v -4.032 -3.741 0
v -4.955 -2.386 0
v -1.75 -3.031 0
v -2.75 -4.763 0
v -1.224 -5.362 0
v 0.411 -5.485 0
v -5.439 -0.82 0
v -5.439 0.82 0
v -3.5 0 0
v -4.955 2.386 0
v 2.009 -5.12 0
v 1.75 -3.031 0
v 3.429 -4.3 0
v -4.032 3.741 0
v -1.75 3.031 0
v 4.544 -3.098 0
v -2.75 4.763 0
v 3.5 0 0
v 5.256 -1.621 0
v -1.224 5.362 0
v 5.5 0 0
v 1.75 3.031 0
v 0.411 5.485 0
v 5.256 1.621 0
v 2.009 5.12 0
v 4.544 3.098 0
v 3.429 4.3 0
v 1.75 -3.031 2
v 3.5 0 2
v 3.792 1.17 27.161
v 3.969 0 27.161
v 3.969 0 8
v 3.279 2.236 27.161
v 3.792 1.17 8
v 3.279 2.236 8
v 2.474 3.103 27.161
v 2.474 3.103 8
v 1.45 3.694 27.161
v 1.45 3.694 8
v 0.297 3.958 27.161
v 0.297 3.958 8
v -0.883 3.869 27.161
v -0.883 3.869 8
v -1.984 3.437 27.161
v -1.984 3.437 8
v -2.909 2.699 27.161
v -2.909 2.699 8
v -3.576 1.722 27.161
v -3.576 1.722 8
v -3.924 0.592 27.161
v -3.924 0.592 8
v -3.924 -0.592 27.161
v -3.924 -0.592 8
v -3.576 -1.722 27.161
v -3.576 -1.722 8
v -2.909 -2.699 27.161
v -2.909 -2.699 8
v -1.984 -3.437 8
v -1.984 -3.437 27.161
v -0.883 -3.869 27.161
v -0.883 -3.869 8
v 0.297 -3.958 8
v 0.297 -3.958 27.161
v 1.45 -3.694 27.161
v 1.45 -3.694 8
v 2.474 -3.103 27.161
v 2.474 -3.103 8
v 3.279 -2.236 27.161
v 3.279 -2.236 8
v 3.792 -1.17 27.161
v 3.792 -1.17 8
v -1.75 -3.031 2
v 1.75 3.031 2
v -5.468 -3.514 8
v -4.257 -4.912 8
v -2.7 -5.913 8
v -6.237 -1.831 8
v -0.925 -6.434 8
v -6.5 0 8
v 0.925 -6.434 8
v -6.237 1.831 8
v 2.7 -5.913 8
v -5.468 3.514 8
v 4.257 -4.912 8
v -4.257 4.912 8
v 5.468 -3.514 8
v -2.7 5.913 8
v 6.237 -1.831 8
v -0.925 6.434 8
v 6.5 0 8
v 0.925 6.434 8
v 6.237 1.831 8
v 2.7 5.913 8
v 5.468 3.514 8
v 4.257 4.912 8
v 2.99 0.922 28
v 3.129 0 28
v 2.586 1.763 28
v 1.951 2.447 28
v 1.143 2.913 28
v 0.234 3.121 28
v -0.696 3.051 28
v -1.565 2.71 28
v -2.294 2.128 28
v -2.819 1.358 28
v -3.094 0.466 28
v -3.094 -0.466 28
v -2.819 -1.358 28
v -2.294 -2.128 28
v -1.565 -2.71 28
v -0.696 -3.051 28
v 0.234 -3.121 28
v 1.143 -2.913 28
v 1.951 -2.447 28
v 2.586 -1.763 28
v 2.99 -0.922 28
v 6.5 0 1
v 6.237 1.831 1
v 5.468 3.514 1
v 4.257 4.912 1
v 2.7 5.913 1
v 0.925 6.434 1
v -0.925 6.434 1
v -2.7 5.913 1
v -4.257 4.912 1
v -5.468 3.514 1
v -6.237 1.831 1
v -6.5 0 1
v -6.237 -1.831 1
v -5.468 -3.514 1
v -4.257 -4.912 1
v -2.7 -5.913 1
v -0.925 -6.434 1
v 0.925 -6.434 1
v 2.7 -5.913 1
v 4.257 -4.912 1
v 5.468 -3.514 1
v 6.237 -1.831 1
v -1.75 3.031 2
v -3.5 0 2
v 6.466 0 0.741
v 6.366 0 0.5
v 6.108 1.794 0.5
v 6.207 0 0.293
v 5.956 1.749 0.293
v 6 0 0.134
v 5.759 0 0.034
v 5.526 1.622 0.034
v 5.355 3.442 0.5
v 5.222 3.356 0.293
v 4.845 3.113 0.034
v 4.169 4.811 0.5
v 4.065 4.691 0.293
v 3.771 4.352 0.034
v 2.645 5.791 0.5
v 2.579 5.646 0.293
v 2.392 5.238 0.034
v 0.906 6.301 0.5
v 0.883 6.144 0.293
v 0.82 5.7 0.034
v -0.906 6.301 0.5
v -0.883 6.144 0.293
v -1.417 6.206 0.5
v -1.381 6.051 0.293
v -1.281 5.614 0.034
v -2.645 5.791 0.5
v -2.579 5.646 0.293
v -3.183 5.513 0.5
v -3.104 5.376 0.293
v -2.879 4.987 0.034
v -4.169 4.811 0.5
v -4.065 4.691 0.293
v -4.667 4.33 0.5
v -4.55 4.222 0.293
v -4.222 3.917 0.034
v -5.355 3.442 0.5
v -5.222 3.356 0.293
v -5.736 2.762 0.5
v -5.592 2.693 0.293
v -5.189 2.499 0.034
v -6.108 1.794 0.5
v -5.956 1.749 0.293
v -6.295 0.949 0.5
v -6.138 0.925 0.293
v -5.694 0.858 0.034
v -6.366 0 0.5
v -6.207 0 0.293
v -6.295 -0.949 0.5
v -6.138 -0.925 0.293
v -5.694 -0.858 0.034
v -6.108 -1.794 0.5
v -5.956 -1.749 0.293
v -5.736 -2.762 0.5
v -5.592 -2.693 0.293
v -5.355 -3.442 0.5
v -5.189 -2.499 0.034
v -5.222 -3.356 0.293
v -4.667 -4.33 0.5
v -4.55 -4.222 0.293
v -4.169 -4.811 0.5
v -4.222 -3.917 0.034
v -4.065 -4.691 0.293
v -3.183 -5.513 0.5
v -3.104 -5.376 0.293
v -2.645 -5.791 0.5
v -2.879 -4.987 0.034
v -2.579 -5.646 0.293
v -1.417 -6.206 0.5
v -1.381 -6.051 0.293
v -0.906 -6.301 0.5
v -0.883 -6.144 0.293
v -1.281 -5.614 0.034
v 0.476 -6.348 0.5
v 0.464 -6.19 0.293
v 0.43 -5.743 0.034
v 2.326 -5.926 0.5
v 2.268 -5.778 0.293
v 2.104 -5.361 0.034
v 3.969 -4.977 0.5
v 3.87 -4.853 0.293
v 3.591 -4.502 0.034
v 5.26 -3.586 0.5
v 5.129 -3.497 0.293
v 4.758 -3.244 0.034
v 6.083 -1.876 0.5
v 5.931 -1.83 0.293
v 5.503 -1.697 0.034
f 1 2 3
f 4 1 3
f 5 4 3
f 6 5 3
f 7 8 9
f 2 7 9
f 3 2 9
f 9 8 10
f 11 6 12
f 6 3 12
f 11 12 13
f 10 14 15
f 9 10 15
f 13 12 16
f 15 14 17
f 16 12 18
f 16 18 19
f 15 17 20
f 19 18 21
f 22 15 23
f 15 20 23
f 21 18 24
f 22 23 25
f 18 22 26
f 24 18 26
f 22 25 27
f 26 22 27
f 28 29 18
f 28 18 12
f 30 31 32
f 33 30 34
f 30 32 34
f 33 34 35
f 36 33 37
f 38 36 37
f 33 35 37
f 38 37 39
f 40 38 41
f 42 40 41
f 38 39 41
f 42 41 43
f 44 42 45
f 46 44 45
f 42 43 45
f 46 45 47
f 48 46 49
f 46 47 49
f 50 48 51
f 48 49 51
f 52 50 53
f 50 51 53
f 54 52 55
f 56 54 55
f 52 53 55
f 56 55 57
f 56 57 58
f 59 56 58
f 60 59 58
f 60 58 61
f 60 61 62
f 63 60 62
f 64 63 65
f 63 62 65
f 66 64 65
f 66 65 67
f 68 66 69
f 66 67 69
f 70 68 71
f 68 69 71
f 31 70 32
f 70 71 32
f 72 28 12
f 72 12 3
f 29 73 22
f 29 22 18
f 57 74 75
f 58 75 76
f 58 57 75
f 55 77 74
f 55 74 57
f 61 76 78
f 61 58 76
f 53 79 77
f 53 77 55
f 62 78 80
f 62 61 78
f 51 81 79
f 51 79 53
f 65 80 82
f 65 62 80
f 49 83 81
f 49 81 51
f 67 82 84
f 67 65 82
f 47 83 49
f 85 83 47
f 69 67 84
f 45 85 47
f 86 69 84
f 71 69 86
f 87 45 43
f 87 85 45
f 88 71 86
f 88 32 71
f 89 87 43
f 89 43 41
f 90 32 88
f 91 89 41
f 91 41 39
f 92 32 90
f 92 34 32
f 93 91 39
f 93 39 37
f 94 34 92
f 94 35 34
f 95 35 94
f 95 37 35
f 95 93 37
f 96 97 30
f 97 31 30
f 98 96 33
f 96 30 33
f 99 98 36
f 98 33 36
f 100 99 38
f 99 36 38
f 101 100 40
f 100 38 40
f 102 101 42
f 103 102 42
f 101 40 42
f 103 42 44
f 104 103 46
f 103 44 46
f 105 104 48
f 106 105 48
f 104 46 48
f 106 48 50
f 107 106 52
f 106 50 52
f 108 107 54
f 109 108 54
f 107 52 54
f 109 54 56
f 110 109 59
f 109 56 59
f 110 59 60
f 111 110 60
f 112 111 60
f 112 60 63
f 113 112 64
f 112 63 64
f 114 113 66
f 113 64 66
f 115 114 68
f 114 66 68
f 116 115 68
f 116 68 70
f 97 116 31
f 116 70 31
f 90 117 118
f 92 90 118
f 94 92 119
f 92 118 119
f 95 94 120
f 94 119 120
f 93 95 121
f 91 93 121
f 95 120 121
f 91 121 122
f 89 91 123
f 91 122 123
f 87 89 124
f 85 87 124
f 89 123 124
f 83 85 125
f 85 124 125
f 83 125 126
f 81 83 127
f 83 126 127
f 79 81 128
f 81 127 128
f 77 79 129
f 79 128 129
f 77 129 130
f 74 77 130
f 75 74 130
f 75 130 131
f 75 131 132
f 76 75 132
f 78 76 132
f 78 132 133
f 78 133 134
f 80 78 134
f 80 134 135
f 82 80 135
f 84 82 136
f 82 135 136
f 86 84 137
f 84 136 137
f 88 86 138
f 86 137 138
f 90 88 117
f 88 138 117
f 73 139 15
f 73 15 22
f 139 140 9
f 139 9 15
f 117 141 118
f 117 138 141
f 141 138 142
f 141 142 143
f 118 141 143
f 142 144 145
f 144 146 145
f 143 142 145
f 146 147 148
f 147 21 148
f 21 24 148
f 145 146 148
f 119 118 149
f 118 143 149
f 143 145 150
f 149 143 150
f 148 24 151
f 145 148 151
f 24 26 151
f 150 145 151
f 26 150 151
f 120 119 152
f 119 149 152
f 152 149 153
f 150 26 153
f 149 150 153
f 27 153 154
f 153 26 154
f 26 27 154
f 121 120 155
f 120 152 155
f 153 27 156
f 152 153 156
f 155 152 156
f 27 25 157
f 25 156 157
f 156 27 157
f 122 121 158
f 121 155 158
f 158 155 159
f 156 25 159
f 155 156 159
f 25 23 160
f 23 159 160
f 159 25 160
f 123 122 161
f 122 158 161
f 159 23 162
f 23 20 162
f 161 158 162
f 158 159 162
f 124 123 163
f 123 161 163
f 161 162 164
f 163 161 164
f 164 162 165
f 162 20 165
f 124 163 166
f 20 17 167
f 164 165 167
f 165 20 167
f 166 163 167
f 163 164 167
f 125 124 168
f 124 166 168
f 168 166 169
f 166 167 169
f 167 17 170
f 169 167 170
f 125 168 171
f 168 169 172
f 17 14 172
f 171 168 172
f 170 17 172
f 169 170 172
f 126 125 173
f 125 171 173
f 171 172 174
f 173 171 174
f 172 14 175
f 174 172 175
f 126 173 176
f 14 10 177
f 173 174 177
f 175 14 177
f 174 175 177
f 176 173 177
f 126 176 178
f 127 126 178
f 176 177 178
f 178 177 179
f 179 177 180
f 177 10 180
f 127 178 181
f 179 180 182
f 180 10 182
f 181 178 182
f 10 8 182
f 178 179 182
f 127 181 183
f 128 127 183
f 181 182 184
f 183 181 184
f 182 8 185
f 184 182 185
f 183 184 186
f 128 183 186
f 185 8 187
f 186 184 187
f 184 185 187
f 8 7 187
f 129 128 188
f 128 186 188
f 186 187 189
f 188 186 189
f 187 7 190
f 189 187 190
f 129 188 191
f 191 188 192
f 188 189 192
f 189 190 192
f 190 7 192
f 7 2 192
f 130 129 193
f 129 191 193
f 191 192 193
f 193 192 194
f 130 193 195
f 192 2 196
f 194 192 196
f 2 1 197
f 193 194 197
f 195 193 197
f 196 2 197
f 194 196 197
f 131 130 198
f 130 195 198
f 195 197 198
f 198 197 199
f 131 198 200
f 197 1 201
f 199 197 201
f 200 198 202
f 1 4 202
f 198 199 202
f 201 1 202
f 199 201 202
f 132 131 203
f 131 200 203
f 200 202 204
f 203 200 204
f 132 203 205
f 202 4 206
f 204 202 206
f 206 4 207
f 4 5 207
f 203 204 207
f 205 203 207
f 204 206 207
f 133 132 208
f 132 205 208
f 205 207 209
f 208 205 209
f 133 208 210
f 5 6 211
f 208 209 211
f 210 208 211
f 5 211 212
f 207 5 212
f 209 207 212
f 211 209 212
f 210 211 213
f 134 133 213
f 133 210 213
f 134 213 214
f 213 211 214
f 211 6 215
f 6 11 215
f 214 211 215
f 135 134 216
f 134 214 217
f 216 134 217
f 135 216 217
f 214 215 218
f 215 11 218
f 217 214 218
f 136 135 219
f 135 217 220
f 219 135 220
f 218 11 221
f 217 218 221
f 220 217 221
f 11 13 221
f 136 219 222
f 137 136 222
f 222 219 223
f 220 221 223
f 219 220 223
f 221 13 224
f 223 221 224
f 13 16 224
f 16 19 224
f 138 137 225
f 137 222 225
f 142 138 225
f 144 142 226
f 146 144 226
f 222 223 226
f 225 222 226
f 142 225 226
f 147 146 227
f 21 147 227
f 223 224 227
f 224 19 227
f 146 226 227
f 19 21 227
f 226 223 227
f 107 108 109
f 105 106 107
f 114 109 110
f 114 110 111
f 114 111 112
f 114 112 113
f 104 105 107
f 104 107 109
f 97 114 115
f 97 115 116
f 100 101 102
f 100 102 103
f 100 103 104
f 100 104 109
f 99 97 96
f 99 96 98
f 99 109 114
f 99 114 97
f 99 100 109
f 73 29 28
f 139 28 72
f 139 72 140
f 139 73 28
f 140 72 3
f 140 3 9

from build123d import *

# Parameters (mm, degrees)
SKETCH_1_R               = 6.5
EXTRUDE_1_DEPTH          = 8
SKETCH_2_R               = 4
EXTRUDE_2_DEPTH          = 20
FILLET_1_R               = 1
CUT_EXTRUDE_1_DEPTH      = 30.470324079
CUT_EXTRUDE_1_DEPTH_BACK = 2


# Read off the part's stored shape, not the designer's step: 5/16-18 机械螺纹 螺柱1
with BuildPart() as part:
    # 草图1 → 凸台-拉伸1 (new body)
    with BuildSketch(Plane.XY):
        Circle(SKETCH_1_R)
    extrude(amount=EXTRUDE_1_DEPTH)

    # 草图2 → 凸台-拉伸2 (add)
    with BuildSketch(Plane.XY.offset(8)):
        Circle(SKETCH_2_R)
    extrude(amount=EXTRUDE_2_DEPTH)

    # 5/16-18 机械螺纹 螺柱1 outline → 5/16-18 机械螺纹 螺柱1 (revolve, cut)
    with BuildSketch(Plane.XZ):
        Polygon((4, 28), (3.12928, 28), (3.96875, 27.16053), (3.96875, 8), (4, 8), align=None)
    revolve(axis=Axis((0, 0, 0), (0, 0, 1)), mode=Mode.SUBTRACT)

    # 圆角1
    fillet_1_edges = [part.edges().sort_by_distance(p)[0] for p in [
        (-6.5, 0, 0),
    ]]
    fillet(fillet_1_edges, radius=FILLET_1_R)

    # 草图4 → 切除-拉伸1 (cut, two sides: drawn at the far end of the back side and taken through both)
    with BuildSketch(Plane(origin=(0, 0, 0), x_dir=(-1, 0, 0), z_dir=(0, 0, -1)).offset(-CUT_EXTRUDE_1_DEPTH_BACK)):
        Polygon((3.5, 0), (1.75, 3.031088913), (-1.75, 3.031088913), (-3.5, 0), (-1.75, -3.031088913), (1.75, -3.031088913), align=None)
    extrude(amount=CUT_EXTRUDE_1_DEPTH + CUT_EXTRUDE_1_DEPTH_BACK, mode=Mode.SUBTRACT)


solid = part.part
